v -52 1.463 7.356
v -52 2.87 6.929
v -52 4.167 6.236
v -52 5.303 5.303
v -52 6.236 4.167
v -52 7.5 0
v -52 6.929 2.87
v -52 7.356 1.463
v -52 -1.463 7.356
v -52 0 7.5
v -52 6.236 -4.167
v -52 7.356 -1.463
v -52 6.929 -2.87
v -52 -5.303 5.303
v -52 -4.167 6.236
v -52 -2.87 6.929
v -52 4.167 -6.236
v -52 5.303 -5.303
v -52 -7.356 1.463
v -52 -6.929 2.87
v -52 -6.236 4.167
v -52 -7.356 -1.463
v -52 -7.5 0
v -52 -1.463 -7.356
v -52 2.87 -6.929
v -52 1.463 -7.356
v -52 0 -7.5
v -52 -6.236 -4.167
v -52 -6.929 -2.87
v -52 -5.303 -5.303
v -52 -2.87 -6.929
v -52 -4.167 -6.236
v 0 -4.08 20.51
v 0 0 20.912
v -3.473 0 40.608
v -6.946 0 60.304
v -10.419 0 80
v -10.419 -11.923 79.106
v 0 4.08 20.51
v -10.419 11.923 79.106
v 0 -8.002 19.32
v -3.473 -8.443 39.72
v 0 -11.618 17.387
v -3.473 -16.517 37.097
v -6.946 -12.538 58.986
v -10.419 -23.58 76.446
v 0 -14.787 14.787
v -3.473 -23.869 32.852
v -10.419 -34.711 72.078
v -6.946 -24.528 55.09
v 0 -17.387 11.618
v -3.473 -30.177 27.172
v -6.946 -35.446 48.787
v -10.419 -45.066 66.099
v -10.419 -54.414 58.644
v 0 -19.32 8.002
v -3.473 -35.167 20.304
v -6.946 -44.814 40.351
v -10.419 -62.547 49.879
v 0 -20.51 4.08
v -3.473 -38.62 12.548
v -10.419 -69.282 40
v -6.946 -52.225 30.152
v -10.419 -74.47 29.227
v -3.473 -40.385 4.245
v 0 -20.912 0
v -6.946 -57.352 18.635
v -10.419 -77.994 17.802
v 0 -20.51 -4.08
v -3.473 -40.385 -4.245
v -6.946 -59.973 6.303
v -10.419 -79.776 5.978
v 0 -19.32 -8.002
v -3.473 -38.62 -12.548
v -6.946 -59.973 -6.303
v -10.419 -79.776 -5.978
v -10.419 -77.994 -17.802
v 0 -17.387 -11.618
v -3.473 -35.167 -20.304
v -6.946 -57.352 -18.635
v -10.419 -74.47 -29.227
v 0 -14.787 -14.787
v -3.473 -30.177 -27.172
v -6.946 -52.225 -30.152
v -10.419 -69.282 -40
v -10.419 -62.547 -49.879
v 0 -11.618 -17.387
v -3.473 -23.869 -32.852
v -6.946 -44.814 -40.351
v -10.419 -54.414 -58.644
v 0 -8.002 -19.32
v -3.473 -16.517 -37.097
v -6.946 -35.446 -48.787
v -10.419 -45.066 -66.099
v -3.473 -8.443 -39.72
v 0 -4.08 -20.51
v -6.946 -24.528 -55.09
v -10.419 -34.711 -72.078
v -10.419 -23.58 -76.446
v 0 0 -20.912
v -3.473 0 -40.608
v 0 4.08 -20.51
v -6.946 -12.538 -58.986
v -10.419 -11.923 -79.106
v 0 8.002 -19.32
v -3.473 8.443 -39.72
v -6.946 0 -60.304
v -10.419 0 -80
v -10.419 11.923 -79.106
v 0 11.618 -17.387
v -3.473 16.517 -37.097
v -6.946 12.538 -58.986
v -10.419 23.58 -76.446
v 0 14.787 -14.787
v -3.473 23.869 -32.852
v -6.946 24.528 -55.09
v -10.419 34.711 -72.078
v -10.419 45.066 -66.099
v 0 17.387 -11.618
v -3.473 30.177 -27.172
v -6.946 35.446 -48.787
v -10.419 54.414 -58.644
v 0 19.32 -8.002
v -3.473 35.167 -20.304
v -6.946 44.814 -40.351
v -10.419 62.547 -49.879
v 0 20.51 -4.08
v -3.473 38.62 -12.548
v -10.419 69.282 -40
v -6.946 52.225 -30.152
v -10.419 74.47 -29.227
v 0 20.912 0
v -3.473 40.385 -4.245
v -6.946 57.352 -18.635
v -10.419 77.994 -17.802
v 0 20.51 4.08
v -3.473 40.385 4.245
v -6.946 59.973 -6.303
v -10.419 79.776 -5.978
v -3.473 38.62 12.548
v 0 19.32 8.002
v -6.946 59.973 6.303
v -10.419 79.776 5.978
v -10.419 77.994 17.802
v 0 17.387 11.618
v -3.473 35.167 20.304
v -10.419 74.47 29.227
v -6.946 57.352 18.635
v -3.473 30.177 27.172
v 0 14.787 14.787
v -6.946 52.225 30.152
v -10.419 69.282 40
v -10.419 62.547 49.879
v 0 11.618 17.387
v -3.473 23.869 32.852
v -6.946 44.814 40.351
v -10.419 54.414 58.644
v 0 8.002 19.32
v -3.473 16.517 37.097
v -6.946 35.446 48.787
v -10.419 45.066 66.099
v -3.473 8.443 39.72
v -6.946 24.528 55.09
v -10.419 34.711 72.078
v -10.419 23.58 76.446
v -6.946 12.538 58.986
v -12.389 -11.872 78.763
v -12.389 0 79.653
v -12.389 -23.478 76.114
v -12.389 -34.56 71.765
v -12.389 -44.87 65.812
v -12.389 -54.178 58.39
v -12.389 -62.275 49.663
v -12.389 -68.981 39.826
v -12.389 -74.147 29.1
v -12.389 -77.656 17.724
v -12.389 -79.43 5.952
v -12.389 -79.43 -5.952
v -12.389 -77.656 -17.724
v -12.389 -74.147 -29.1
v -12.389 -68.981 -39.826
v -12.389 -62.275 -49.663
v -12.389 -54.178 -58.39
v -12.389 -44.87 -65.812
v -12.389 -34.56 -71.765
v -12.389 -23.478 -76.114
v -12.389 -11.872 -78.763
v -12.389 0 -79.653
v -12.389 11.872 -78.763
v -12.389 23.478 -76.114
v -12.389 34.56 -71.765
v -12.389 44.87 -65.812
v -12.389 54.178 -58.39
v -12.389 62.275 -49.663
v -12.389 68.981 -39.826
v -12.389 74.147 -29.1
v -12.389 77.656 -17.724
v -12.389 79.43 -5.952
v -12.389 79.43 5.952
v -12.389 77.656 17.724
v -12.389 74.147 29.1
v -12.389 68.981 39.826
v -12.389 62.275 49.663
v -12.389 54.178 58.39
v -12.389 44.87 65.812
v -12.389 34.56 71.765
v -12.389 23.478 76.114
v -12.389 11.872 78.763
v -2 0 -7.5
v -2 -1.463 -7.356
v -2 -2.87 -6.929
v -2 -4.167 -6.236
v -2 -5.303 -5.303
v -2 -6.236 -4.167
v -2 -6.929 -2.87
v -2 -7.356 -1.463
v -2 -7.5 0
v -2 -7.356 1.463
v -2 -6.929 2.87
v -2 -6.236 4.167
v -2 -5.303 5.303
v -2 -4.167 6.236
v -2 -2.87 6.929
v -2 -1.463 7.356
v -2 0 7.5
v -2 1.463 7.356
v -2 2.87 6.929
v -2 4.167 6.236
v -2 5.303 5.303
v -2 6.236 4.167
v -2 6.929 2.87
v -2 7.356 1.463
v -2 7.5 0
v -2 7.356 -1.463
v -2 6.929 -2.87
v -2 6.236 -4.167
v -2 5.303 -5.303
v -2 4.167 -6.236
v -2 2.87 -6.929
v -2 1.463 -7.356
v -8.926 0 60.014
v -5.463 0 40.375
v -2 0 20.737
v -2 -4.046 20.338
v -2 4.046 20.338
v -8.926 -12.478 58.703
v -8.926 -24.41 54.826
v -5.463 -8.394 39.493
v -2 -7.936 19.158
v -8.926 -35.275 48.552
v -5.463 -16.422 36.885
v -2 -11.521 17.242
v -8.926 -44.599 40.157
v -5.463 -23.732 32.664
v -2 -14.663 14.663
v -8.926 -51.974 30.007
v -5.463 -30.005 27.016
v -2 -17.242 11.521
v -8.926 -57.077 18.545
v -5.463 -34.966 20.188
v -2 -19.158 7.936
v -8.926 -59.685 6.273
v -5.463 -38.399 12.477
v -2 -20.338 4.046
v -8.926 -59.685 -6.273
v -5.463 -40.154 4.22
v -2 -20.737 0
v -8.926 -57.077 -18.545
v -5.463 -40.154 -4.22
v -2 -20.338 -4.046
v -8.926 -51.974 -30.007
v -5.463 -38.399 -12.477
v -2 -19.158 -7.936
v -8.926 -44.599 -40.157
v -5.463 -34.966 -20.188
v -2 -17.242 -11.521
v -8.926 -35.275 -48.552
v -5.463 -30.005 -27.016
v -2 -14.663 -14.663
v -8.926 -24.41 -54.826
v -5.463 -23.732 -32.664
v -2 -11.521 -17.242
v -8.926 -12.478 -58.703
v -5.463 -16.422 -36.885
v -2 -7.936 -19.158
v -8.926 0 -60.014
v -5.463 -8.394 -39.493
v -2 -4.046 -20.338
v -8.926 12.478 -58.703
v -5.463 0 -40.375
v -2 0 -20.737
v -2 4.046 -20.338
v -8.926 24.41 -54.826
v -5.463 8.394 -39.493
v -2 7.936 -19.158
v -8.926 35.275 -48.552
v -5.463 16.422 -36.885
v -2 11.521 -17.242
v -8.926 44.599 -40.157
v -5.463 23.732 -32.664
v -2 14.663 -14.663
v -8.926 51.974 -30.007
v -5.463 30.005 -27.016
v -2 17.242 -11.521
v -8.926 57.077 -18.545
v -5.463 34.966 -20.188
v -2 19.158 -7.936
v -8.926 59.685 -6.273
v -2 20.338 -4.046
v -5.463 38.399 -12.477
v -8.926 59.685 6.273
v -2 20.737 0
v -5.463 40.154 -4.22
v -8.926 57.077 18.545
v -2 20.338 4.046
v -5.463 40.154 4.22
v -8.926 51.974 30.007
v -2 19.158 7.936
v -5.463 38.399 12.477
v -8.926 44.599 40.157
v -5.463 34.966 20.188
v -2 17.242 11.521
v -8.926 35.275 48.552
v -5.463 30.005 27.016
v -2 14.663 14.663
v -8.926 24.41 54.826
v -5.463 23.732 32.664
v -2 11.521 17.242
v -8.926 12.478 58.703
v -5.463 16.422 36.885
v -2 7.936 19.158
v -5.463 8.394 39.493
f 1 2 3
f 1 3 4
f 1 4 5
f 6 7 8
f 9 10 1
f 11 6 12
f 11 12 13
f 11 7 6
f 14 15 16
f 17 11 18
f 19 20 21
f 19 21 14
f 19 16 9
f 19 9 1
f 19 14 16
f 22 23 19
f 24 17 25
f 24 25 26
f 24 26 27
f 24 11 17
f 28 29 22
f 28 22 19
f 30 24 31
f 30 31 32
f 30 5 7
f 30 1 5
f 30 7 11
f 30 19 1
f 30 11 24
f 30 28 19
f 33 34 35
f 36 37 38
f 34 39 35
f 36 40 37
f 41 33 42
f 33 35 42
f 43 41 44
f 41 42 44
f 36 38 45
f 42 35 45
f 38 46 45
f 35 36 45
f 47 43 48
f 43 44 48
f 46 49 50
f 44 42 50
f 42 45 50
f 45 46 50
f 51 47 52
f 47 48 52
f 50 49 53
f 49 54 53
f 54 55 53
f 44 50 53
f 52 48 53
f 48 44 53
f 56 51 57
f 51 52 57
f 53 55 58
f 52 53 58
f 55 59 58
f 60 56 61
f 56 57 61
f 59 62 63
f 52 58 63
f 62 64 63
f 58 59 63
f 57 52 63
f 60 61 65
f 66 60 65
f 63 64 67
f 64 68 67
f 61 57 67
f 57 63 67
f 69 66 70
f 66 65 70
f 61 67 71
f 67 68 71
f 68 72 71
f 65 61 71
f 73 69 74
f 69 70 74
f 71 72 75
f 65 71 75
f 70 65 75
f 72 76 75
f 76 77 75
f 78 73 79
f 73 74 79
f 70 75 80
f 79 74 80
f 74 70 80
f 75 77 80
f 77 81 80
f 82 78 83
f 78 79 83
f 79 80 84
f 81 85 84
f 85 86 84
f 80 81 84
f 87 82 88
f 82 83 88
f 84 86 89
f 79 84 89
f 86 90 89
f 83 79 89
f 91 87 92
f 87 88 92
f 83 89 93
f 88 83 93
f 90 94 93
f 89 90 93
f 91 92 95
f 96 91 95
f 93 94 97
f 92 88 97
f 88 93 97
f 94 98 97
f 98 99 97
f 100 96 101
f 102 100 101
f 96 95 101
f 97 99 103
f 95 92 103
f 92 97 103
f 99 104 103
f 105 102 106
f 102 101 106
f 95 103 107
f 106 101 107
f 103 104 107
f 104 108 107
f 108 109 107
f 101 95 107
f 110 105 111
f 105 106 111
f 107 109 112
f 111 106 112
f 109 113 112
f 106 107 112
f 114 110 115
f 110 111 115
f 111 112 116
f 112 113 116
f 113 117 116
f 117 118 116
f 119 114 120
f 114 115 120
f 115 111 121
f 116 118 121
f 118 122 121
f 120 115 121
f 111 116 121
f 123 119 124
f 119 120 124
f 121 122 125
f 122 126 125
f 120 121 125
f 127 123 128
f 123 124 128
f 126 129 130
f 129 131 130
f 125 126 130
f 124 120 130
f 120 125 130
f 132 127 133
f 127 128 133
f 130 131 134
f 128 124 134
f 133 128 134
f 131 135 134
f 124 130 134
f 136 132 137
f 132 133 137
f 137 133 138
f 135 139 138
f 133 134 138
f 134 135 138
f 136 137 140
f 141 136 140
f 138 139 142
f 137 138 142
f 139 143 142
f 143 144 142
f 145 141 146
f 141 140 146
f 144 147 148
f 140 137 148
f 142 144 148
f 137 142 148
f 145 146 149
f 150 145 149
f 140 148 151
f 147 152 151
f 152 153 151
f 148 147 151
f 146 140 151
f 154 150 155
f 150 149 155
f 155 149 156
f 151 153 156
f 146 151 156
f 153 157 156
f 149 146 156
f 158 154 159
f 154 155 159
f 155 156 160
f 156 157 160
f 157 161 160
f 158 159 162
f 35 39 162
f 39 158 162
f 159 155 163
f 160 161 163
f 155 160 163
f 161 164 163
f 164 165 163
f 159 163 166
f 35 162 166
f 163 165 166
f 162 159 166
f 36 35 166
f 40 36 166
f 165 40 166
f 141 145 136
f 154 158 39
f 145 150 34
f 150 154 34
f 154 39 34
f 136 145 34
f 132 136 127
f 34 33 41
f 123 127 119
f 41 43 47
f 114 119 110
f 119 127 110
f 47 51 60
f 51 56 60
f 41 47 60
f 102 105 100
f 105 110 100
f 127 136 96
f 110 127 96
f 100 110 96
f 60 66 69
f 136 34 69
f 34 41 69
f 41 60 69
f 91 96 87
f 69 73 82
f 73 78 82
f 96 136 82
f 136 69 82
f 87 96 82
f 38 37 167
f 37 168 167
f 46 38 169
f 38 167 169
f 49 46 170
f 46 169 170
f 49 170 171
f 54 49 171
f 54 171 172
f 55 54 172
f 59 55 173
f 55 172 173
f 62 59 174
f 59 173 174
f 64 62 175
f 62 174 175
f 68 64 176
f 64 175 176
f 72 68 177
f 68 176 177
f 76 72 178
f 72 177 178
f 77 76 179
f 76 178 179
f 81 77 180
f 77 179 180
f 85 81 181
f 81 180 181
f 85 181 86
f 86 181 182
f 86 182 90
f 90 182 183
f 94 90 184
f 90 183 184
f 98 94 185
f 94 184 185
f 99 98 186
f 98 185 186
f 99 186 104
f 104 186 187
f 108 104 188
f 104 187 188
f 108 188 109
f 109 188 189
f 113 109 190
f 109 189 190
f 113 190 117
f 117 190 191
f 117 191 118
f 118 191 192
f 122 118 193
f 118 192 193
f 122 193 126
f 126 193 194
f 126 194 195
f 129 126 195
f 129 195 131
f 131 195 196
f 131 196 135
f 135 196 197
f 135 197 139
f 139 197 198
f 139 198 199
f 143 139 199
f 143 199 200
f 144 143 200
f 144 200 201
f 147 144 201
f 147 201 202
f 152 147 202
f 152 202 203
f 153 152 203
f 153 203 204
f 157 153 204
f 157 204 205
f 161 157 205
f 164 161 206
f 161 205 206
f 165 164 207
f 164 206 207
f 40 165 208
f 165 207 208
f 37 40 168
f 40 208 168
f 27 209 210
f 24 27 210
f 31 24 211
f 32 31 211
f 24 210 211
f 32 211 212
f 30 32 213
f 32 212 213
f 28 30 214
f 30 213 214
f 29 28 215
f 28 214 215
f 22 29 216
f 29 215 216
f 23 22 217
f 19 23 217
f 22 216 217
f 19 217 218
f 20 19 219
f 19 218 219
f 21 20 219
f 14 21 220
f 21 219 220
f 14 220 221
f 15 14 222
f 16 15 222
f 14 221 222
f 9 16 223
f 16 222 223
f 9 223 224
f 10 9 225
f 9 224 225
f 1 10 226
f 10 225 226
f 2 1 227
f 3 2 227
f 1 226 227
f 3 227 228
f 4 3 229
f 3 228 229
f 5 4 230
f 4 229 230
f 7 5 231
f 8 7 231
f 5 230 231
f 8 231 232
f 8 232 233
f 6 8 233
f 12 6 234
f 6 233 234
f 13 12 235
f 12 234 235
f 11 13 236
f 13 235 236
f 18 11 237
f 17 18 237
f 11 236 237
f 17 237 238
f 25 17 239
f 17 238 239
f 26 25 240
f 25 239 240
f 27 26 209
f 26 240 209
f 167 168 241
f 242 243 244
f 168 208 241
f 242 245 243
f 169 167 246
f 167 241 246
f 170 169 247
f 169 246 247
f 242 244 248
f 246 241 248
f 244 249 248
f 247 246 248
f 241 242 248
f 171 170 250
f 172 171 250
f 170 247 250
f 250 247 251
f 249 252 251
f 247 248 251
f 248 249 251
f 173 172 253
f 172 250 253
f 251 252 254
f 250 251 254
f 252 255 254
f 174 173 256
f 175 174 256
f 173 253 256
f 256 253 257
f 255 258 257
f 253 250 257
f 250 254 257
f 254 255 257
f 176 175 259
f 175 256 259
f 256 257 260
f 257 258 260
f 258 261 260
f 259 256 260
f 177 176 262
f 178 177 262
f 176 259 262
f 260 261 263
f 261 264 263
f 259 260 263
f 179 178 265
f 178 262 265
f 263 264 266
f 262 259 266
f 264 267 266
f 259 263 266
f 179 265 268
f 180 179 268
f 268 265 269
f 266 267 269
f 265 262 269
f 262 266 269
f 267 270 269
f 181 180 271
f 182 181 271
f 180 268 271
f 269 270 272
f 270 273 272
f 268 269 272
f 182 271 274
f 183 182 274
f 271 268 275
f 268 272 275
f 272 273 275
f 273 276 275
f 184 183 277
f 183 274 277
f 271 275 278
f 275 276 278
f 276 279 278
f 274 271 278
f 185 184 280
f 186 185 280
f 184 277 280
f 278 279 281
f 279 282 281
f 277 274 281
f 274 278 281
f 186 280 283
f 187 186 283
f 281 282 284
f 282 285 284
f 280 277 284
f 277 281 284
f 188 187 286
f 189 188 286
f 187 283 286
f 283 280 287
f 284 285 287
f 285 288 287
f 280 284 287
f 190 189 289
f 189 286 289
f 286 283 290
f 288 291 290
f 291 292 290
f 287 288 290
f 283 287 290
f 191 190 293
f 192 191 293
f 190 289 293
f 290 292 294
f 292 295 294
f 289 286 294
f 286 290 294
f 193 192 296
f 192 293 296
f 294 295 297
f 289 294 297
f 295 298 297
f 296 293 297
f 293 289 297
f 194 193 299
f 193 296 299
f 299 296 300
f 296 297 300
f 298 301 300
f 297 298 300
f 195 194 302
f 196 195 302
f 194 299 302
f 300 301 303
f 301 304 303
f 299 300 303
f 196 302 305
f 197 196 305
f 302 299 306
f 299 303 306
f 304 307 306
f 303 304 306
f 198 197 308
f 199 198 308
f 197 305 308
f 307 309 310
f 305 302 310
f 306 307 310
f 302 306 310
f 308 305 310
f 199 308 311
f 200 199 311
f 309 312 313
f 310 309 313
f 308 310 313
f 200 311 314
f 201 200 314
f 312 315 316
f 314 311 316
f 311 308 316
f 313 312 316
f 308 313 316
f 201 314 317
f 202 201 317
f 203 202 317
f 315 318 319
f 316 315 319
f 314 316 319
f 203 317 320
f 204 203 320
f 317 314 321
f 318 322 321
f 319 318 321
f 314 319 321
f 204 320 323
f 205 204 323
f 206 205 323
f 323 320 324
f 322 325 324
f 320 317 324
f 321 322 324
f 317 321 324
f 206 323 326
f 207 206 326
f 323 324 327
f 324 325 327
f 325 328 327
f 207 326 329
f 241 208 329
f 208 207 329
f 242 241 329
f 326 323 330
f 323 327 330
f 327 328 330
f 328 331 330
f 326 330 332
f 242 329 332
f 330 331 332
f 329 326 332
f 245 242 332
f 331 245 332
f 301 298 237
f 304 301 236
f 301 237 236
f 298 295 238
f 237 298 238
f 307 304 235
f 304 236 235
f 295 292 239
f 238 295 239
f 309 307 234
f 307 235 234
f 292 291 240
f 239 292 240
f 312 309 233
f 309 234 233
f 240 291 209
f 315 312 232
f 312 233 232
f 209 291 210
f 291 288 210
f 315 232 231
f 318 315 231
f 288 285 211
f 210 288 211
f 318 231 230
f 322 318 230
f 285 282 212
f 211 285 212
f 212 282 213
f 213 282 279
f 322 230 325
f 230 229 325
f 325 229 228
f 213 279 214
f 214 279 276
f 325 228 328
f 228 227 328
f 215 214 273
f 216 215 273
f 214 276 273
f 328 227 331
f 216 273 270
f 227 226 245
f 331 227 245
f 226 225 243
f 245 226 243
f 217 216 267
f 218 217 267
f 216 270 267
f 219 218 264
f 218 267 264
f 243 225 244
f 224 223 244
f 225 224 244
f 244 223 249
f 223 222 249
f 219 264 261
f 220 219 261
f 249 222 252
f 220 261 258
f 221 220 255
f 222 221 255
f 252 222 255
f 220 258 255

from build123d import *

# Parameters (mm, degrees)
SKETCH_2_R      = 7.5
EXTRUDE_1_DEPTH = 50


with BuildPart() as part:
    # 草图1 → 旋转1 (revolve)
    with BuildSketch(Plane.XY, mode=Mode.PRIVATE) as revolve_1_sk:
        Polygon((0, 0), (0, 20.911534819), (-10.41889066, 80), (-12.388506166, 79.652703645), (-2, 20.736557492), (-2, 0), align=None)
    revolve(revolve_1_sk.sketch.rotate(Axis((-2, 0, 0), (1, 0, 0)), 90), axis=Axis((-2, 0, 0), (1, 0, 0)))

    # 草图2 → 凸台-拉伸1 (add)
    with BuildSketch(Plane.ZY.offset(2)):
        with Locations(Location((0, 0, 0), (0, 0, 180))):
            Circle(SKETCH_2_R)
    extrude(amount=EXTRUDE_1_DEPTH)


solid = part.part
